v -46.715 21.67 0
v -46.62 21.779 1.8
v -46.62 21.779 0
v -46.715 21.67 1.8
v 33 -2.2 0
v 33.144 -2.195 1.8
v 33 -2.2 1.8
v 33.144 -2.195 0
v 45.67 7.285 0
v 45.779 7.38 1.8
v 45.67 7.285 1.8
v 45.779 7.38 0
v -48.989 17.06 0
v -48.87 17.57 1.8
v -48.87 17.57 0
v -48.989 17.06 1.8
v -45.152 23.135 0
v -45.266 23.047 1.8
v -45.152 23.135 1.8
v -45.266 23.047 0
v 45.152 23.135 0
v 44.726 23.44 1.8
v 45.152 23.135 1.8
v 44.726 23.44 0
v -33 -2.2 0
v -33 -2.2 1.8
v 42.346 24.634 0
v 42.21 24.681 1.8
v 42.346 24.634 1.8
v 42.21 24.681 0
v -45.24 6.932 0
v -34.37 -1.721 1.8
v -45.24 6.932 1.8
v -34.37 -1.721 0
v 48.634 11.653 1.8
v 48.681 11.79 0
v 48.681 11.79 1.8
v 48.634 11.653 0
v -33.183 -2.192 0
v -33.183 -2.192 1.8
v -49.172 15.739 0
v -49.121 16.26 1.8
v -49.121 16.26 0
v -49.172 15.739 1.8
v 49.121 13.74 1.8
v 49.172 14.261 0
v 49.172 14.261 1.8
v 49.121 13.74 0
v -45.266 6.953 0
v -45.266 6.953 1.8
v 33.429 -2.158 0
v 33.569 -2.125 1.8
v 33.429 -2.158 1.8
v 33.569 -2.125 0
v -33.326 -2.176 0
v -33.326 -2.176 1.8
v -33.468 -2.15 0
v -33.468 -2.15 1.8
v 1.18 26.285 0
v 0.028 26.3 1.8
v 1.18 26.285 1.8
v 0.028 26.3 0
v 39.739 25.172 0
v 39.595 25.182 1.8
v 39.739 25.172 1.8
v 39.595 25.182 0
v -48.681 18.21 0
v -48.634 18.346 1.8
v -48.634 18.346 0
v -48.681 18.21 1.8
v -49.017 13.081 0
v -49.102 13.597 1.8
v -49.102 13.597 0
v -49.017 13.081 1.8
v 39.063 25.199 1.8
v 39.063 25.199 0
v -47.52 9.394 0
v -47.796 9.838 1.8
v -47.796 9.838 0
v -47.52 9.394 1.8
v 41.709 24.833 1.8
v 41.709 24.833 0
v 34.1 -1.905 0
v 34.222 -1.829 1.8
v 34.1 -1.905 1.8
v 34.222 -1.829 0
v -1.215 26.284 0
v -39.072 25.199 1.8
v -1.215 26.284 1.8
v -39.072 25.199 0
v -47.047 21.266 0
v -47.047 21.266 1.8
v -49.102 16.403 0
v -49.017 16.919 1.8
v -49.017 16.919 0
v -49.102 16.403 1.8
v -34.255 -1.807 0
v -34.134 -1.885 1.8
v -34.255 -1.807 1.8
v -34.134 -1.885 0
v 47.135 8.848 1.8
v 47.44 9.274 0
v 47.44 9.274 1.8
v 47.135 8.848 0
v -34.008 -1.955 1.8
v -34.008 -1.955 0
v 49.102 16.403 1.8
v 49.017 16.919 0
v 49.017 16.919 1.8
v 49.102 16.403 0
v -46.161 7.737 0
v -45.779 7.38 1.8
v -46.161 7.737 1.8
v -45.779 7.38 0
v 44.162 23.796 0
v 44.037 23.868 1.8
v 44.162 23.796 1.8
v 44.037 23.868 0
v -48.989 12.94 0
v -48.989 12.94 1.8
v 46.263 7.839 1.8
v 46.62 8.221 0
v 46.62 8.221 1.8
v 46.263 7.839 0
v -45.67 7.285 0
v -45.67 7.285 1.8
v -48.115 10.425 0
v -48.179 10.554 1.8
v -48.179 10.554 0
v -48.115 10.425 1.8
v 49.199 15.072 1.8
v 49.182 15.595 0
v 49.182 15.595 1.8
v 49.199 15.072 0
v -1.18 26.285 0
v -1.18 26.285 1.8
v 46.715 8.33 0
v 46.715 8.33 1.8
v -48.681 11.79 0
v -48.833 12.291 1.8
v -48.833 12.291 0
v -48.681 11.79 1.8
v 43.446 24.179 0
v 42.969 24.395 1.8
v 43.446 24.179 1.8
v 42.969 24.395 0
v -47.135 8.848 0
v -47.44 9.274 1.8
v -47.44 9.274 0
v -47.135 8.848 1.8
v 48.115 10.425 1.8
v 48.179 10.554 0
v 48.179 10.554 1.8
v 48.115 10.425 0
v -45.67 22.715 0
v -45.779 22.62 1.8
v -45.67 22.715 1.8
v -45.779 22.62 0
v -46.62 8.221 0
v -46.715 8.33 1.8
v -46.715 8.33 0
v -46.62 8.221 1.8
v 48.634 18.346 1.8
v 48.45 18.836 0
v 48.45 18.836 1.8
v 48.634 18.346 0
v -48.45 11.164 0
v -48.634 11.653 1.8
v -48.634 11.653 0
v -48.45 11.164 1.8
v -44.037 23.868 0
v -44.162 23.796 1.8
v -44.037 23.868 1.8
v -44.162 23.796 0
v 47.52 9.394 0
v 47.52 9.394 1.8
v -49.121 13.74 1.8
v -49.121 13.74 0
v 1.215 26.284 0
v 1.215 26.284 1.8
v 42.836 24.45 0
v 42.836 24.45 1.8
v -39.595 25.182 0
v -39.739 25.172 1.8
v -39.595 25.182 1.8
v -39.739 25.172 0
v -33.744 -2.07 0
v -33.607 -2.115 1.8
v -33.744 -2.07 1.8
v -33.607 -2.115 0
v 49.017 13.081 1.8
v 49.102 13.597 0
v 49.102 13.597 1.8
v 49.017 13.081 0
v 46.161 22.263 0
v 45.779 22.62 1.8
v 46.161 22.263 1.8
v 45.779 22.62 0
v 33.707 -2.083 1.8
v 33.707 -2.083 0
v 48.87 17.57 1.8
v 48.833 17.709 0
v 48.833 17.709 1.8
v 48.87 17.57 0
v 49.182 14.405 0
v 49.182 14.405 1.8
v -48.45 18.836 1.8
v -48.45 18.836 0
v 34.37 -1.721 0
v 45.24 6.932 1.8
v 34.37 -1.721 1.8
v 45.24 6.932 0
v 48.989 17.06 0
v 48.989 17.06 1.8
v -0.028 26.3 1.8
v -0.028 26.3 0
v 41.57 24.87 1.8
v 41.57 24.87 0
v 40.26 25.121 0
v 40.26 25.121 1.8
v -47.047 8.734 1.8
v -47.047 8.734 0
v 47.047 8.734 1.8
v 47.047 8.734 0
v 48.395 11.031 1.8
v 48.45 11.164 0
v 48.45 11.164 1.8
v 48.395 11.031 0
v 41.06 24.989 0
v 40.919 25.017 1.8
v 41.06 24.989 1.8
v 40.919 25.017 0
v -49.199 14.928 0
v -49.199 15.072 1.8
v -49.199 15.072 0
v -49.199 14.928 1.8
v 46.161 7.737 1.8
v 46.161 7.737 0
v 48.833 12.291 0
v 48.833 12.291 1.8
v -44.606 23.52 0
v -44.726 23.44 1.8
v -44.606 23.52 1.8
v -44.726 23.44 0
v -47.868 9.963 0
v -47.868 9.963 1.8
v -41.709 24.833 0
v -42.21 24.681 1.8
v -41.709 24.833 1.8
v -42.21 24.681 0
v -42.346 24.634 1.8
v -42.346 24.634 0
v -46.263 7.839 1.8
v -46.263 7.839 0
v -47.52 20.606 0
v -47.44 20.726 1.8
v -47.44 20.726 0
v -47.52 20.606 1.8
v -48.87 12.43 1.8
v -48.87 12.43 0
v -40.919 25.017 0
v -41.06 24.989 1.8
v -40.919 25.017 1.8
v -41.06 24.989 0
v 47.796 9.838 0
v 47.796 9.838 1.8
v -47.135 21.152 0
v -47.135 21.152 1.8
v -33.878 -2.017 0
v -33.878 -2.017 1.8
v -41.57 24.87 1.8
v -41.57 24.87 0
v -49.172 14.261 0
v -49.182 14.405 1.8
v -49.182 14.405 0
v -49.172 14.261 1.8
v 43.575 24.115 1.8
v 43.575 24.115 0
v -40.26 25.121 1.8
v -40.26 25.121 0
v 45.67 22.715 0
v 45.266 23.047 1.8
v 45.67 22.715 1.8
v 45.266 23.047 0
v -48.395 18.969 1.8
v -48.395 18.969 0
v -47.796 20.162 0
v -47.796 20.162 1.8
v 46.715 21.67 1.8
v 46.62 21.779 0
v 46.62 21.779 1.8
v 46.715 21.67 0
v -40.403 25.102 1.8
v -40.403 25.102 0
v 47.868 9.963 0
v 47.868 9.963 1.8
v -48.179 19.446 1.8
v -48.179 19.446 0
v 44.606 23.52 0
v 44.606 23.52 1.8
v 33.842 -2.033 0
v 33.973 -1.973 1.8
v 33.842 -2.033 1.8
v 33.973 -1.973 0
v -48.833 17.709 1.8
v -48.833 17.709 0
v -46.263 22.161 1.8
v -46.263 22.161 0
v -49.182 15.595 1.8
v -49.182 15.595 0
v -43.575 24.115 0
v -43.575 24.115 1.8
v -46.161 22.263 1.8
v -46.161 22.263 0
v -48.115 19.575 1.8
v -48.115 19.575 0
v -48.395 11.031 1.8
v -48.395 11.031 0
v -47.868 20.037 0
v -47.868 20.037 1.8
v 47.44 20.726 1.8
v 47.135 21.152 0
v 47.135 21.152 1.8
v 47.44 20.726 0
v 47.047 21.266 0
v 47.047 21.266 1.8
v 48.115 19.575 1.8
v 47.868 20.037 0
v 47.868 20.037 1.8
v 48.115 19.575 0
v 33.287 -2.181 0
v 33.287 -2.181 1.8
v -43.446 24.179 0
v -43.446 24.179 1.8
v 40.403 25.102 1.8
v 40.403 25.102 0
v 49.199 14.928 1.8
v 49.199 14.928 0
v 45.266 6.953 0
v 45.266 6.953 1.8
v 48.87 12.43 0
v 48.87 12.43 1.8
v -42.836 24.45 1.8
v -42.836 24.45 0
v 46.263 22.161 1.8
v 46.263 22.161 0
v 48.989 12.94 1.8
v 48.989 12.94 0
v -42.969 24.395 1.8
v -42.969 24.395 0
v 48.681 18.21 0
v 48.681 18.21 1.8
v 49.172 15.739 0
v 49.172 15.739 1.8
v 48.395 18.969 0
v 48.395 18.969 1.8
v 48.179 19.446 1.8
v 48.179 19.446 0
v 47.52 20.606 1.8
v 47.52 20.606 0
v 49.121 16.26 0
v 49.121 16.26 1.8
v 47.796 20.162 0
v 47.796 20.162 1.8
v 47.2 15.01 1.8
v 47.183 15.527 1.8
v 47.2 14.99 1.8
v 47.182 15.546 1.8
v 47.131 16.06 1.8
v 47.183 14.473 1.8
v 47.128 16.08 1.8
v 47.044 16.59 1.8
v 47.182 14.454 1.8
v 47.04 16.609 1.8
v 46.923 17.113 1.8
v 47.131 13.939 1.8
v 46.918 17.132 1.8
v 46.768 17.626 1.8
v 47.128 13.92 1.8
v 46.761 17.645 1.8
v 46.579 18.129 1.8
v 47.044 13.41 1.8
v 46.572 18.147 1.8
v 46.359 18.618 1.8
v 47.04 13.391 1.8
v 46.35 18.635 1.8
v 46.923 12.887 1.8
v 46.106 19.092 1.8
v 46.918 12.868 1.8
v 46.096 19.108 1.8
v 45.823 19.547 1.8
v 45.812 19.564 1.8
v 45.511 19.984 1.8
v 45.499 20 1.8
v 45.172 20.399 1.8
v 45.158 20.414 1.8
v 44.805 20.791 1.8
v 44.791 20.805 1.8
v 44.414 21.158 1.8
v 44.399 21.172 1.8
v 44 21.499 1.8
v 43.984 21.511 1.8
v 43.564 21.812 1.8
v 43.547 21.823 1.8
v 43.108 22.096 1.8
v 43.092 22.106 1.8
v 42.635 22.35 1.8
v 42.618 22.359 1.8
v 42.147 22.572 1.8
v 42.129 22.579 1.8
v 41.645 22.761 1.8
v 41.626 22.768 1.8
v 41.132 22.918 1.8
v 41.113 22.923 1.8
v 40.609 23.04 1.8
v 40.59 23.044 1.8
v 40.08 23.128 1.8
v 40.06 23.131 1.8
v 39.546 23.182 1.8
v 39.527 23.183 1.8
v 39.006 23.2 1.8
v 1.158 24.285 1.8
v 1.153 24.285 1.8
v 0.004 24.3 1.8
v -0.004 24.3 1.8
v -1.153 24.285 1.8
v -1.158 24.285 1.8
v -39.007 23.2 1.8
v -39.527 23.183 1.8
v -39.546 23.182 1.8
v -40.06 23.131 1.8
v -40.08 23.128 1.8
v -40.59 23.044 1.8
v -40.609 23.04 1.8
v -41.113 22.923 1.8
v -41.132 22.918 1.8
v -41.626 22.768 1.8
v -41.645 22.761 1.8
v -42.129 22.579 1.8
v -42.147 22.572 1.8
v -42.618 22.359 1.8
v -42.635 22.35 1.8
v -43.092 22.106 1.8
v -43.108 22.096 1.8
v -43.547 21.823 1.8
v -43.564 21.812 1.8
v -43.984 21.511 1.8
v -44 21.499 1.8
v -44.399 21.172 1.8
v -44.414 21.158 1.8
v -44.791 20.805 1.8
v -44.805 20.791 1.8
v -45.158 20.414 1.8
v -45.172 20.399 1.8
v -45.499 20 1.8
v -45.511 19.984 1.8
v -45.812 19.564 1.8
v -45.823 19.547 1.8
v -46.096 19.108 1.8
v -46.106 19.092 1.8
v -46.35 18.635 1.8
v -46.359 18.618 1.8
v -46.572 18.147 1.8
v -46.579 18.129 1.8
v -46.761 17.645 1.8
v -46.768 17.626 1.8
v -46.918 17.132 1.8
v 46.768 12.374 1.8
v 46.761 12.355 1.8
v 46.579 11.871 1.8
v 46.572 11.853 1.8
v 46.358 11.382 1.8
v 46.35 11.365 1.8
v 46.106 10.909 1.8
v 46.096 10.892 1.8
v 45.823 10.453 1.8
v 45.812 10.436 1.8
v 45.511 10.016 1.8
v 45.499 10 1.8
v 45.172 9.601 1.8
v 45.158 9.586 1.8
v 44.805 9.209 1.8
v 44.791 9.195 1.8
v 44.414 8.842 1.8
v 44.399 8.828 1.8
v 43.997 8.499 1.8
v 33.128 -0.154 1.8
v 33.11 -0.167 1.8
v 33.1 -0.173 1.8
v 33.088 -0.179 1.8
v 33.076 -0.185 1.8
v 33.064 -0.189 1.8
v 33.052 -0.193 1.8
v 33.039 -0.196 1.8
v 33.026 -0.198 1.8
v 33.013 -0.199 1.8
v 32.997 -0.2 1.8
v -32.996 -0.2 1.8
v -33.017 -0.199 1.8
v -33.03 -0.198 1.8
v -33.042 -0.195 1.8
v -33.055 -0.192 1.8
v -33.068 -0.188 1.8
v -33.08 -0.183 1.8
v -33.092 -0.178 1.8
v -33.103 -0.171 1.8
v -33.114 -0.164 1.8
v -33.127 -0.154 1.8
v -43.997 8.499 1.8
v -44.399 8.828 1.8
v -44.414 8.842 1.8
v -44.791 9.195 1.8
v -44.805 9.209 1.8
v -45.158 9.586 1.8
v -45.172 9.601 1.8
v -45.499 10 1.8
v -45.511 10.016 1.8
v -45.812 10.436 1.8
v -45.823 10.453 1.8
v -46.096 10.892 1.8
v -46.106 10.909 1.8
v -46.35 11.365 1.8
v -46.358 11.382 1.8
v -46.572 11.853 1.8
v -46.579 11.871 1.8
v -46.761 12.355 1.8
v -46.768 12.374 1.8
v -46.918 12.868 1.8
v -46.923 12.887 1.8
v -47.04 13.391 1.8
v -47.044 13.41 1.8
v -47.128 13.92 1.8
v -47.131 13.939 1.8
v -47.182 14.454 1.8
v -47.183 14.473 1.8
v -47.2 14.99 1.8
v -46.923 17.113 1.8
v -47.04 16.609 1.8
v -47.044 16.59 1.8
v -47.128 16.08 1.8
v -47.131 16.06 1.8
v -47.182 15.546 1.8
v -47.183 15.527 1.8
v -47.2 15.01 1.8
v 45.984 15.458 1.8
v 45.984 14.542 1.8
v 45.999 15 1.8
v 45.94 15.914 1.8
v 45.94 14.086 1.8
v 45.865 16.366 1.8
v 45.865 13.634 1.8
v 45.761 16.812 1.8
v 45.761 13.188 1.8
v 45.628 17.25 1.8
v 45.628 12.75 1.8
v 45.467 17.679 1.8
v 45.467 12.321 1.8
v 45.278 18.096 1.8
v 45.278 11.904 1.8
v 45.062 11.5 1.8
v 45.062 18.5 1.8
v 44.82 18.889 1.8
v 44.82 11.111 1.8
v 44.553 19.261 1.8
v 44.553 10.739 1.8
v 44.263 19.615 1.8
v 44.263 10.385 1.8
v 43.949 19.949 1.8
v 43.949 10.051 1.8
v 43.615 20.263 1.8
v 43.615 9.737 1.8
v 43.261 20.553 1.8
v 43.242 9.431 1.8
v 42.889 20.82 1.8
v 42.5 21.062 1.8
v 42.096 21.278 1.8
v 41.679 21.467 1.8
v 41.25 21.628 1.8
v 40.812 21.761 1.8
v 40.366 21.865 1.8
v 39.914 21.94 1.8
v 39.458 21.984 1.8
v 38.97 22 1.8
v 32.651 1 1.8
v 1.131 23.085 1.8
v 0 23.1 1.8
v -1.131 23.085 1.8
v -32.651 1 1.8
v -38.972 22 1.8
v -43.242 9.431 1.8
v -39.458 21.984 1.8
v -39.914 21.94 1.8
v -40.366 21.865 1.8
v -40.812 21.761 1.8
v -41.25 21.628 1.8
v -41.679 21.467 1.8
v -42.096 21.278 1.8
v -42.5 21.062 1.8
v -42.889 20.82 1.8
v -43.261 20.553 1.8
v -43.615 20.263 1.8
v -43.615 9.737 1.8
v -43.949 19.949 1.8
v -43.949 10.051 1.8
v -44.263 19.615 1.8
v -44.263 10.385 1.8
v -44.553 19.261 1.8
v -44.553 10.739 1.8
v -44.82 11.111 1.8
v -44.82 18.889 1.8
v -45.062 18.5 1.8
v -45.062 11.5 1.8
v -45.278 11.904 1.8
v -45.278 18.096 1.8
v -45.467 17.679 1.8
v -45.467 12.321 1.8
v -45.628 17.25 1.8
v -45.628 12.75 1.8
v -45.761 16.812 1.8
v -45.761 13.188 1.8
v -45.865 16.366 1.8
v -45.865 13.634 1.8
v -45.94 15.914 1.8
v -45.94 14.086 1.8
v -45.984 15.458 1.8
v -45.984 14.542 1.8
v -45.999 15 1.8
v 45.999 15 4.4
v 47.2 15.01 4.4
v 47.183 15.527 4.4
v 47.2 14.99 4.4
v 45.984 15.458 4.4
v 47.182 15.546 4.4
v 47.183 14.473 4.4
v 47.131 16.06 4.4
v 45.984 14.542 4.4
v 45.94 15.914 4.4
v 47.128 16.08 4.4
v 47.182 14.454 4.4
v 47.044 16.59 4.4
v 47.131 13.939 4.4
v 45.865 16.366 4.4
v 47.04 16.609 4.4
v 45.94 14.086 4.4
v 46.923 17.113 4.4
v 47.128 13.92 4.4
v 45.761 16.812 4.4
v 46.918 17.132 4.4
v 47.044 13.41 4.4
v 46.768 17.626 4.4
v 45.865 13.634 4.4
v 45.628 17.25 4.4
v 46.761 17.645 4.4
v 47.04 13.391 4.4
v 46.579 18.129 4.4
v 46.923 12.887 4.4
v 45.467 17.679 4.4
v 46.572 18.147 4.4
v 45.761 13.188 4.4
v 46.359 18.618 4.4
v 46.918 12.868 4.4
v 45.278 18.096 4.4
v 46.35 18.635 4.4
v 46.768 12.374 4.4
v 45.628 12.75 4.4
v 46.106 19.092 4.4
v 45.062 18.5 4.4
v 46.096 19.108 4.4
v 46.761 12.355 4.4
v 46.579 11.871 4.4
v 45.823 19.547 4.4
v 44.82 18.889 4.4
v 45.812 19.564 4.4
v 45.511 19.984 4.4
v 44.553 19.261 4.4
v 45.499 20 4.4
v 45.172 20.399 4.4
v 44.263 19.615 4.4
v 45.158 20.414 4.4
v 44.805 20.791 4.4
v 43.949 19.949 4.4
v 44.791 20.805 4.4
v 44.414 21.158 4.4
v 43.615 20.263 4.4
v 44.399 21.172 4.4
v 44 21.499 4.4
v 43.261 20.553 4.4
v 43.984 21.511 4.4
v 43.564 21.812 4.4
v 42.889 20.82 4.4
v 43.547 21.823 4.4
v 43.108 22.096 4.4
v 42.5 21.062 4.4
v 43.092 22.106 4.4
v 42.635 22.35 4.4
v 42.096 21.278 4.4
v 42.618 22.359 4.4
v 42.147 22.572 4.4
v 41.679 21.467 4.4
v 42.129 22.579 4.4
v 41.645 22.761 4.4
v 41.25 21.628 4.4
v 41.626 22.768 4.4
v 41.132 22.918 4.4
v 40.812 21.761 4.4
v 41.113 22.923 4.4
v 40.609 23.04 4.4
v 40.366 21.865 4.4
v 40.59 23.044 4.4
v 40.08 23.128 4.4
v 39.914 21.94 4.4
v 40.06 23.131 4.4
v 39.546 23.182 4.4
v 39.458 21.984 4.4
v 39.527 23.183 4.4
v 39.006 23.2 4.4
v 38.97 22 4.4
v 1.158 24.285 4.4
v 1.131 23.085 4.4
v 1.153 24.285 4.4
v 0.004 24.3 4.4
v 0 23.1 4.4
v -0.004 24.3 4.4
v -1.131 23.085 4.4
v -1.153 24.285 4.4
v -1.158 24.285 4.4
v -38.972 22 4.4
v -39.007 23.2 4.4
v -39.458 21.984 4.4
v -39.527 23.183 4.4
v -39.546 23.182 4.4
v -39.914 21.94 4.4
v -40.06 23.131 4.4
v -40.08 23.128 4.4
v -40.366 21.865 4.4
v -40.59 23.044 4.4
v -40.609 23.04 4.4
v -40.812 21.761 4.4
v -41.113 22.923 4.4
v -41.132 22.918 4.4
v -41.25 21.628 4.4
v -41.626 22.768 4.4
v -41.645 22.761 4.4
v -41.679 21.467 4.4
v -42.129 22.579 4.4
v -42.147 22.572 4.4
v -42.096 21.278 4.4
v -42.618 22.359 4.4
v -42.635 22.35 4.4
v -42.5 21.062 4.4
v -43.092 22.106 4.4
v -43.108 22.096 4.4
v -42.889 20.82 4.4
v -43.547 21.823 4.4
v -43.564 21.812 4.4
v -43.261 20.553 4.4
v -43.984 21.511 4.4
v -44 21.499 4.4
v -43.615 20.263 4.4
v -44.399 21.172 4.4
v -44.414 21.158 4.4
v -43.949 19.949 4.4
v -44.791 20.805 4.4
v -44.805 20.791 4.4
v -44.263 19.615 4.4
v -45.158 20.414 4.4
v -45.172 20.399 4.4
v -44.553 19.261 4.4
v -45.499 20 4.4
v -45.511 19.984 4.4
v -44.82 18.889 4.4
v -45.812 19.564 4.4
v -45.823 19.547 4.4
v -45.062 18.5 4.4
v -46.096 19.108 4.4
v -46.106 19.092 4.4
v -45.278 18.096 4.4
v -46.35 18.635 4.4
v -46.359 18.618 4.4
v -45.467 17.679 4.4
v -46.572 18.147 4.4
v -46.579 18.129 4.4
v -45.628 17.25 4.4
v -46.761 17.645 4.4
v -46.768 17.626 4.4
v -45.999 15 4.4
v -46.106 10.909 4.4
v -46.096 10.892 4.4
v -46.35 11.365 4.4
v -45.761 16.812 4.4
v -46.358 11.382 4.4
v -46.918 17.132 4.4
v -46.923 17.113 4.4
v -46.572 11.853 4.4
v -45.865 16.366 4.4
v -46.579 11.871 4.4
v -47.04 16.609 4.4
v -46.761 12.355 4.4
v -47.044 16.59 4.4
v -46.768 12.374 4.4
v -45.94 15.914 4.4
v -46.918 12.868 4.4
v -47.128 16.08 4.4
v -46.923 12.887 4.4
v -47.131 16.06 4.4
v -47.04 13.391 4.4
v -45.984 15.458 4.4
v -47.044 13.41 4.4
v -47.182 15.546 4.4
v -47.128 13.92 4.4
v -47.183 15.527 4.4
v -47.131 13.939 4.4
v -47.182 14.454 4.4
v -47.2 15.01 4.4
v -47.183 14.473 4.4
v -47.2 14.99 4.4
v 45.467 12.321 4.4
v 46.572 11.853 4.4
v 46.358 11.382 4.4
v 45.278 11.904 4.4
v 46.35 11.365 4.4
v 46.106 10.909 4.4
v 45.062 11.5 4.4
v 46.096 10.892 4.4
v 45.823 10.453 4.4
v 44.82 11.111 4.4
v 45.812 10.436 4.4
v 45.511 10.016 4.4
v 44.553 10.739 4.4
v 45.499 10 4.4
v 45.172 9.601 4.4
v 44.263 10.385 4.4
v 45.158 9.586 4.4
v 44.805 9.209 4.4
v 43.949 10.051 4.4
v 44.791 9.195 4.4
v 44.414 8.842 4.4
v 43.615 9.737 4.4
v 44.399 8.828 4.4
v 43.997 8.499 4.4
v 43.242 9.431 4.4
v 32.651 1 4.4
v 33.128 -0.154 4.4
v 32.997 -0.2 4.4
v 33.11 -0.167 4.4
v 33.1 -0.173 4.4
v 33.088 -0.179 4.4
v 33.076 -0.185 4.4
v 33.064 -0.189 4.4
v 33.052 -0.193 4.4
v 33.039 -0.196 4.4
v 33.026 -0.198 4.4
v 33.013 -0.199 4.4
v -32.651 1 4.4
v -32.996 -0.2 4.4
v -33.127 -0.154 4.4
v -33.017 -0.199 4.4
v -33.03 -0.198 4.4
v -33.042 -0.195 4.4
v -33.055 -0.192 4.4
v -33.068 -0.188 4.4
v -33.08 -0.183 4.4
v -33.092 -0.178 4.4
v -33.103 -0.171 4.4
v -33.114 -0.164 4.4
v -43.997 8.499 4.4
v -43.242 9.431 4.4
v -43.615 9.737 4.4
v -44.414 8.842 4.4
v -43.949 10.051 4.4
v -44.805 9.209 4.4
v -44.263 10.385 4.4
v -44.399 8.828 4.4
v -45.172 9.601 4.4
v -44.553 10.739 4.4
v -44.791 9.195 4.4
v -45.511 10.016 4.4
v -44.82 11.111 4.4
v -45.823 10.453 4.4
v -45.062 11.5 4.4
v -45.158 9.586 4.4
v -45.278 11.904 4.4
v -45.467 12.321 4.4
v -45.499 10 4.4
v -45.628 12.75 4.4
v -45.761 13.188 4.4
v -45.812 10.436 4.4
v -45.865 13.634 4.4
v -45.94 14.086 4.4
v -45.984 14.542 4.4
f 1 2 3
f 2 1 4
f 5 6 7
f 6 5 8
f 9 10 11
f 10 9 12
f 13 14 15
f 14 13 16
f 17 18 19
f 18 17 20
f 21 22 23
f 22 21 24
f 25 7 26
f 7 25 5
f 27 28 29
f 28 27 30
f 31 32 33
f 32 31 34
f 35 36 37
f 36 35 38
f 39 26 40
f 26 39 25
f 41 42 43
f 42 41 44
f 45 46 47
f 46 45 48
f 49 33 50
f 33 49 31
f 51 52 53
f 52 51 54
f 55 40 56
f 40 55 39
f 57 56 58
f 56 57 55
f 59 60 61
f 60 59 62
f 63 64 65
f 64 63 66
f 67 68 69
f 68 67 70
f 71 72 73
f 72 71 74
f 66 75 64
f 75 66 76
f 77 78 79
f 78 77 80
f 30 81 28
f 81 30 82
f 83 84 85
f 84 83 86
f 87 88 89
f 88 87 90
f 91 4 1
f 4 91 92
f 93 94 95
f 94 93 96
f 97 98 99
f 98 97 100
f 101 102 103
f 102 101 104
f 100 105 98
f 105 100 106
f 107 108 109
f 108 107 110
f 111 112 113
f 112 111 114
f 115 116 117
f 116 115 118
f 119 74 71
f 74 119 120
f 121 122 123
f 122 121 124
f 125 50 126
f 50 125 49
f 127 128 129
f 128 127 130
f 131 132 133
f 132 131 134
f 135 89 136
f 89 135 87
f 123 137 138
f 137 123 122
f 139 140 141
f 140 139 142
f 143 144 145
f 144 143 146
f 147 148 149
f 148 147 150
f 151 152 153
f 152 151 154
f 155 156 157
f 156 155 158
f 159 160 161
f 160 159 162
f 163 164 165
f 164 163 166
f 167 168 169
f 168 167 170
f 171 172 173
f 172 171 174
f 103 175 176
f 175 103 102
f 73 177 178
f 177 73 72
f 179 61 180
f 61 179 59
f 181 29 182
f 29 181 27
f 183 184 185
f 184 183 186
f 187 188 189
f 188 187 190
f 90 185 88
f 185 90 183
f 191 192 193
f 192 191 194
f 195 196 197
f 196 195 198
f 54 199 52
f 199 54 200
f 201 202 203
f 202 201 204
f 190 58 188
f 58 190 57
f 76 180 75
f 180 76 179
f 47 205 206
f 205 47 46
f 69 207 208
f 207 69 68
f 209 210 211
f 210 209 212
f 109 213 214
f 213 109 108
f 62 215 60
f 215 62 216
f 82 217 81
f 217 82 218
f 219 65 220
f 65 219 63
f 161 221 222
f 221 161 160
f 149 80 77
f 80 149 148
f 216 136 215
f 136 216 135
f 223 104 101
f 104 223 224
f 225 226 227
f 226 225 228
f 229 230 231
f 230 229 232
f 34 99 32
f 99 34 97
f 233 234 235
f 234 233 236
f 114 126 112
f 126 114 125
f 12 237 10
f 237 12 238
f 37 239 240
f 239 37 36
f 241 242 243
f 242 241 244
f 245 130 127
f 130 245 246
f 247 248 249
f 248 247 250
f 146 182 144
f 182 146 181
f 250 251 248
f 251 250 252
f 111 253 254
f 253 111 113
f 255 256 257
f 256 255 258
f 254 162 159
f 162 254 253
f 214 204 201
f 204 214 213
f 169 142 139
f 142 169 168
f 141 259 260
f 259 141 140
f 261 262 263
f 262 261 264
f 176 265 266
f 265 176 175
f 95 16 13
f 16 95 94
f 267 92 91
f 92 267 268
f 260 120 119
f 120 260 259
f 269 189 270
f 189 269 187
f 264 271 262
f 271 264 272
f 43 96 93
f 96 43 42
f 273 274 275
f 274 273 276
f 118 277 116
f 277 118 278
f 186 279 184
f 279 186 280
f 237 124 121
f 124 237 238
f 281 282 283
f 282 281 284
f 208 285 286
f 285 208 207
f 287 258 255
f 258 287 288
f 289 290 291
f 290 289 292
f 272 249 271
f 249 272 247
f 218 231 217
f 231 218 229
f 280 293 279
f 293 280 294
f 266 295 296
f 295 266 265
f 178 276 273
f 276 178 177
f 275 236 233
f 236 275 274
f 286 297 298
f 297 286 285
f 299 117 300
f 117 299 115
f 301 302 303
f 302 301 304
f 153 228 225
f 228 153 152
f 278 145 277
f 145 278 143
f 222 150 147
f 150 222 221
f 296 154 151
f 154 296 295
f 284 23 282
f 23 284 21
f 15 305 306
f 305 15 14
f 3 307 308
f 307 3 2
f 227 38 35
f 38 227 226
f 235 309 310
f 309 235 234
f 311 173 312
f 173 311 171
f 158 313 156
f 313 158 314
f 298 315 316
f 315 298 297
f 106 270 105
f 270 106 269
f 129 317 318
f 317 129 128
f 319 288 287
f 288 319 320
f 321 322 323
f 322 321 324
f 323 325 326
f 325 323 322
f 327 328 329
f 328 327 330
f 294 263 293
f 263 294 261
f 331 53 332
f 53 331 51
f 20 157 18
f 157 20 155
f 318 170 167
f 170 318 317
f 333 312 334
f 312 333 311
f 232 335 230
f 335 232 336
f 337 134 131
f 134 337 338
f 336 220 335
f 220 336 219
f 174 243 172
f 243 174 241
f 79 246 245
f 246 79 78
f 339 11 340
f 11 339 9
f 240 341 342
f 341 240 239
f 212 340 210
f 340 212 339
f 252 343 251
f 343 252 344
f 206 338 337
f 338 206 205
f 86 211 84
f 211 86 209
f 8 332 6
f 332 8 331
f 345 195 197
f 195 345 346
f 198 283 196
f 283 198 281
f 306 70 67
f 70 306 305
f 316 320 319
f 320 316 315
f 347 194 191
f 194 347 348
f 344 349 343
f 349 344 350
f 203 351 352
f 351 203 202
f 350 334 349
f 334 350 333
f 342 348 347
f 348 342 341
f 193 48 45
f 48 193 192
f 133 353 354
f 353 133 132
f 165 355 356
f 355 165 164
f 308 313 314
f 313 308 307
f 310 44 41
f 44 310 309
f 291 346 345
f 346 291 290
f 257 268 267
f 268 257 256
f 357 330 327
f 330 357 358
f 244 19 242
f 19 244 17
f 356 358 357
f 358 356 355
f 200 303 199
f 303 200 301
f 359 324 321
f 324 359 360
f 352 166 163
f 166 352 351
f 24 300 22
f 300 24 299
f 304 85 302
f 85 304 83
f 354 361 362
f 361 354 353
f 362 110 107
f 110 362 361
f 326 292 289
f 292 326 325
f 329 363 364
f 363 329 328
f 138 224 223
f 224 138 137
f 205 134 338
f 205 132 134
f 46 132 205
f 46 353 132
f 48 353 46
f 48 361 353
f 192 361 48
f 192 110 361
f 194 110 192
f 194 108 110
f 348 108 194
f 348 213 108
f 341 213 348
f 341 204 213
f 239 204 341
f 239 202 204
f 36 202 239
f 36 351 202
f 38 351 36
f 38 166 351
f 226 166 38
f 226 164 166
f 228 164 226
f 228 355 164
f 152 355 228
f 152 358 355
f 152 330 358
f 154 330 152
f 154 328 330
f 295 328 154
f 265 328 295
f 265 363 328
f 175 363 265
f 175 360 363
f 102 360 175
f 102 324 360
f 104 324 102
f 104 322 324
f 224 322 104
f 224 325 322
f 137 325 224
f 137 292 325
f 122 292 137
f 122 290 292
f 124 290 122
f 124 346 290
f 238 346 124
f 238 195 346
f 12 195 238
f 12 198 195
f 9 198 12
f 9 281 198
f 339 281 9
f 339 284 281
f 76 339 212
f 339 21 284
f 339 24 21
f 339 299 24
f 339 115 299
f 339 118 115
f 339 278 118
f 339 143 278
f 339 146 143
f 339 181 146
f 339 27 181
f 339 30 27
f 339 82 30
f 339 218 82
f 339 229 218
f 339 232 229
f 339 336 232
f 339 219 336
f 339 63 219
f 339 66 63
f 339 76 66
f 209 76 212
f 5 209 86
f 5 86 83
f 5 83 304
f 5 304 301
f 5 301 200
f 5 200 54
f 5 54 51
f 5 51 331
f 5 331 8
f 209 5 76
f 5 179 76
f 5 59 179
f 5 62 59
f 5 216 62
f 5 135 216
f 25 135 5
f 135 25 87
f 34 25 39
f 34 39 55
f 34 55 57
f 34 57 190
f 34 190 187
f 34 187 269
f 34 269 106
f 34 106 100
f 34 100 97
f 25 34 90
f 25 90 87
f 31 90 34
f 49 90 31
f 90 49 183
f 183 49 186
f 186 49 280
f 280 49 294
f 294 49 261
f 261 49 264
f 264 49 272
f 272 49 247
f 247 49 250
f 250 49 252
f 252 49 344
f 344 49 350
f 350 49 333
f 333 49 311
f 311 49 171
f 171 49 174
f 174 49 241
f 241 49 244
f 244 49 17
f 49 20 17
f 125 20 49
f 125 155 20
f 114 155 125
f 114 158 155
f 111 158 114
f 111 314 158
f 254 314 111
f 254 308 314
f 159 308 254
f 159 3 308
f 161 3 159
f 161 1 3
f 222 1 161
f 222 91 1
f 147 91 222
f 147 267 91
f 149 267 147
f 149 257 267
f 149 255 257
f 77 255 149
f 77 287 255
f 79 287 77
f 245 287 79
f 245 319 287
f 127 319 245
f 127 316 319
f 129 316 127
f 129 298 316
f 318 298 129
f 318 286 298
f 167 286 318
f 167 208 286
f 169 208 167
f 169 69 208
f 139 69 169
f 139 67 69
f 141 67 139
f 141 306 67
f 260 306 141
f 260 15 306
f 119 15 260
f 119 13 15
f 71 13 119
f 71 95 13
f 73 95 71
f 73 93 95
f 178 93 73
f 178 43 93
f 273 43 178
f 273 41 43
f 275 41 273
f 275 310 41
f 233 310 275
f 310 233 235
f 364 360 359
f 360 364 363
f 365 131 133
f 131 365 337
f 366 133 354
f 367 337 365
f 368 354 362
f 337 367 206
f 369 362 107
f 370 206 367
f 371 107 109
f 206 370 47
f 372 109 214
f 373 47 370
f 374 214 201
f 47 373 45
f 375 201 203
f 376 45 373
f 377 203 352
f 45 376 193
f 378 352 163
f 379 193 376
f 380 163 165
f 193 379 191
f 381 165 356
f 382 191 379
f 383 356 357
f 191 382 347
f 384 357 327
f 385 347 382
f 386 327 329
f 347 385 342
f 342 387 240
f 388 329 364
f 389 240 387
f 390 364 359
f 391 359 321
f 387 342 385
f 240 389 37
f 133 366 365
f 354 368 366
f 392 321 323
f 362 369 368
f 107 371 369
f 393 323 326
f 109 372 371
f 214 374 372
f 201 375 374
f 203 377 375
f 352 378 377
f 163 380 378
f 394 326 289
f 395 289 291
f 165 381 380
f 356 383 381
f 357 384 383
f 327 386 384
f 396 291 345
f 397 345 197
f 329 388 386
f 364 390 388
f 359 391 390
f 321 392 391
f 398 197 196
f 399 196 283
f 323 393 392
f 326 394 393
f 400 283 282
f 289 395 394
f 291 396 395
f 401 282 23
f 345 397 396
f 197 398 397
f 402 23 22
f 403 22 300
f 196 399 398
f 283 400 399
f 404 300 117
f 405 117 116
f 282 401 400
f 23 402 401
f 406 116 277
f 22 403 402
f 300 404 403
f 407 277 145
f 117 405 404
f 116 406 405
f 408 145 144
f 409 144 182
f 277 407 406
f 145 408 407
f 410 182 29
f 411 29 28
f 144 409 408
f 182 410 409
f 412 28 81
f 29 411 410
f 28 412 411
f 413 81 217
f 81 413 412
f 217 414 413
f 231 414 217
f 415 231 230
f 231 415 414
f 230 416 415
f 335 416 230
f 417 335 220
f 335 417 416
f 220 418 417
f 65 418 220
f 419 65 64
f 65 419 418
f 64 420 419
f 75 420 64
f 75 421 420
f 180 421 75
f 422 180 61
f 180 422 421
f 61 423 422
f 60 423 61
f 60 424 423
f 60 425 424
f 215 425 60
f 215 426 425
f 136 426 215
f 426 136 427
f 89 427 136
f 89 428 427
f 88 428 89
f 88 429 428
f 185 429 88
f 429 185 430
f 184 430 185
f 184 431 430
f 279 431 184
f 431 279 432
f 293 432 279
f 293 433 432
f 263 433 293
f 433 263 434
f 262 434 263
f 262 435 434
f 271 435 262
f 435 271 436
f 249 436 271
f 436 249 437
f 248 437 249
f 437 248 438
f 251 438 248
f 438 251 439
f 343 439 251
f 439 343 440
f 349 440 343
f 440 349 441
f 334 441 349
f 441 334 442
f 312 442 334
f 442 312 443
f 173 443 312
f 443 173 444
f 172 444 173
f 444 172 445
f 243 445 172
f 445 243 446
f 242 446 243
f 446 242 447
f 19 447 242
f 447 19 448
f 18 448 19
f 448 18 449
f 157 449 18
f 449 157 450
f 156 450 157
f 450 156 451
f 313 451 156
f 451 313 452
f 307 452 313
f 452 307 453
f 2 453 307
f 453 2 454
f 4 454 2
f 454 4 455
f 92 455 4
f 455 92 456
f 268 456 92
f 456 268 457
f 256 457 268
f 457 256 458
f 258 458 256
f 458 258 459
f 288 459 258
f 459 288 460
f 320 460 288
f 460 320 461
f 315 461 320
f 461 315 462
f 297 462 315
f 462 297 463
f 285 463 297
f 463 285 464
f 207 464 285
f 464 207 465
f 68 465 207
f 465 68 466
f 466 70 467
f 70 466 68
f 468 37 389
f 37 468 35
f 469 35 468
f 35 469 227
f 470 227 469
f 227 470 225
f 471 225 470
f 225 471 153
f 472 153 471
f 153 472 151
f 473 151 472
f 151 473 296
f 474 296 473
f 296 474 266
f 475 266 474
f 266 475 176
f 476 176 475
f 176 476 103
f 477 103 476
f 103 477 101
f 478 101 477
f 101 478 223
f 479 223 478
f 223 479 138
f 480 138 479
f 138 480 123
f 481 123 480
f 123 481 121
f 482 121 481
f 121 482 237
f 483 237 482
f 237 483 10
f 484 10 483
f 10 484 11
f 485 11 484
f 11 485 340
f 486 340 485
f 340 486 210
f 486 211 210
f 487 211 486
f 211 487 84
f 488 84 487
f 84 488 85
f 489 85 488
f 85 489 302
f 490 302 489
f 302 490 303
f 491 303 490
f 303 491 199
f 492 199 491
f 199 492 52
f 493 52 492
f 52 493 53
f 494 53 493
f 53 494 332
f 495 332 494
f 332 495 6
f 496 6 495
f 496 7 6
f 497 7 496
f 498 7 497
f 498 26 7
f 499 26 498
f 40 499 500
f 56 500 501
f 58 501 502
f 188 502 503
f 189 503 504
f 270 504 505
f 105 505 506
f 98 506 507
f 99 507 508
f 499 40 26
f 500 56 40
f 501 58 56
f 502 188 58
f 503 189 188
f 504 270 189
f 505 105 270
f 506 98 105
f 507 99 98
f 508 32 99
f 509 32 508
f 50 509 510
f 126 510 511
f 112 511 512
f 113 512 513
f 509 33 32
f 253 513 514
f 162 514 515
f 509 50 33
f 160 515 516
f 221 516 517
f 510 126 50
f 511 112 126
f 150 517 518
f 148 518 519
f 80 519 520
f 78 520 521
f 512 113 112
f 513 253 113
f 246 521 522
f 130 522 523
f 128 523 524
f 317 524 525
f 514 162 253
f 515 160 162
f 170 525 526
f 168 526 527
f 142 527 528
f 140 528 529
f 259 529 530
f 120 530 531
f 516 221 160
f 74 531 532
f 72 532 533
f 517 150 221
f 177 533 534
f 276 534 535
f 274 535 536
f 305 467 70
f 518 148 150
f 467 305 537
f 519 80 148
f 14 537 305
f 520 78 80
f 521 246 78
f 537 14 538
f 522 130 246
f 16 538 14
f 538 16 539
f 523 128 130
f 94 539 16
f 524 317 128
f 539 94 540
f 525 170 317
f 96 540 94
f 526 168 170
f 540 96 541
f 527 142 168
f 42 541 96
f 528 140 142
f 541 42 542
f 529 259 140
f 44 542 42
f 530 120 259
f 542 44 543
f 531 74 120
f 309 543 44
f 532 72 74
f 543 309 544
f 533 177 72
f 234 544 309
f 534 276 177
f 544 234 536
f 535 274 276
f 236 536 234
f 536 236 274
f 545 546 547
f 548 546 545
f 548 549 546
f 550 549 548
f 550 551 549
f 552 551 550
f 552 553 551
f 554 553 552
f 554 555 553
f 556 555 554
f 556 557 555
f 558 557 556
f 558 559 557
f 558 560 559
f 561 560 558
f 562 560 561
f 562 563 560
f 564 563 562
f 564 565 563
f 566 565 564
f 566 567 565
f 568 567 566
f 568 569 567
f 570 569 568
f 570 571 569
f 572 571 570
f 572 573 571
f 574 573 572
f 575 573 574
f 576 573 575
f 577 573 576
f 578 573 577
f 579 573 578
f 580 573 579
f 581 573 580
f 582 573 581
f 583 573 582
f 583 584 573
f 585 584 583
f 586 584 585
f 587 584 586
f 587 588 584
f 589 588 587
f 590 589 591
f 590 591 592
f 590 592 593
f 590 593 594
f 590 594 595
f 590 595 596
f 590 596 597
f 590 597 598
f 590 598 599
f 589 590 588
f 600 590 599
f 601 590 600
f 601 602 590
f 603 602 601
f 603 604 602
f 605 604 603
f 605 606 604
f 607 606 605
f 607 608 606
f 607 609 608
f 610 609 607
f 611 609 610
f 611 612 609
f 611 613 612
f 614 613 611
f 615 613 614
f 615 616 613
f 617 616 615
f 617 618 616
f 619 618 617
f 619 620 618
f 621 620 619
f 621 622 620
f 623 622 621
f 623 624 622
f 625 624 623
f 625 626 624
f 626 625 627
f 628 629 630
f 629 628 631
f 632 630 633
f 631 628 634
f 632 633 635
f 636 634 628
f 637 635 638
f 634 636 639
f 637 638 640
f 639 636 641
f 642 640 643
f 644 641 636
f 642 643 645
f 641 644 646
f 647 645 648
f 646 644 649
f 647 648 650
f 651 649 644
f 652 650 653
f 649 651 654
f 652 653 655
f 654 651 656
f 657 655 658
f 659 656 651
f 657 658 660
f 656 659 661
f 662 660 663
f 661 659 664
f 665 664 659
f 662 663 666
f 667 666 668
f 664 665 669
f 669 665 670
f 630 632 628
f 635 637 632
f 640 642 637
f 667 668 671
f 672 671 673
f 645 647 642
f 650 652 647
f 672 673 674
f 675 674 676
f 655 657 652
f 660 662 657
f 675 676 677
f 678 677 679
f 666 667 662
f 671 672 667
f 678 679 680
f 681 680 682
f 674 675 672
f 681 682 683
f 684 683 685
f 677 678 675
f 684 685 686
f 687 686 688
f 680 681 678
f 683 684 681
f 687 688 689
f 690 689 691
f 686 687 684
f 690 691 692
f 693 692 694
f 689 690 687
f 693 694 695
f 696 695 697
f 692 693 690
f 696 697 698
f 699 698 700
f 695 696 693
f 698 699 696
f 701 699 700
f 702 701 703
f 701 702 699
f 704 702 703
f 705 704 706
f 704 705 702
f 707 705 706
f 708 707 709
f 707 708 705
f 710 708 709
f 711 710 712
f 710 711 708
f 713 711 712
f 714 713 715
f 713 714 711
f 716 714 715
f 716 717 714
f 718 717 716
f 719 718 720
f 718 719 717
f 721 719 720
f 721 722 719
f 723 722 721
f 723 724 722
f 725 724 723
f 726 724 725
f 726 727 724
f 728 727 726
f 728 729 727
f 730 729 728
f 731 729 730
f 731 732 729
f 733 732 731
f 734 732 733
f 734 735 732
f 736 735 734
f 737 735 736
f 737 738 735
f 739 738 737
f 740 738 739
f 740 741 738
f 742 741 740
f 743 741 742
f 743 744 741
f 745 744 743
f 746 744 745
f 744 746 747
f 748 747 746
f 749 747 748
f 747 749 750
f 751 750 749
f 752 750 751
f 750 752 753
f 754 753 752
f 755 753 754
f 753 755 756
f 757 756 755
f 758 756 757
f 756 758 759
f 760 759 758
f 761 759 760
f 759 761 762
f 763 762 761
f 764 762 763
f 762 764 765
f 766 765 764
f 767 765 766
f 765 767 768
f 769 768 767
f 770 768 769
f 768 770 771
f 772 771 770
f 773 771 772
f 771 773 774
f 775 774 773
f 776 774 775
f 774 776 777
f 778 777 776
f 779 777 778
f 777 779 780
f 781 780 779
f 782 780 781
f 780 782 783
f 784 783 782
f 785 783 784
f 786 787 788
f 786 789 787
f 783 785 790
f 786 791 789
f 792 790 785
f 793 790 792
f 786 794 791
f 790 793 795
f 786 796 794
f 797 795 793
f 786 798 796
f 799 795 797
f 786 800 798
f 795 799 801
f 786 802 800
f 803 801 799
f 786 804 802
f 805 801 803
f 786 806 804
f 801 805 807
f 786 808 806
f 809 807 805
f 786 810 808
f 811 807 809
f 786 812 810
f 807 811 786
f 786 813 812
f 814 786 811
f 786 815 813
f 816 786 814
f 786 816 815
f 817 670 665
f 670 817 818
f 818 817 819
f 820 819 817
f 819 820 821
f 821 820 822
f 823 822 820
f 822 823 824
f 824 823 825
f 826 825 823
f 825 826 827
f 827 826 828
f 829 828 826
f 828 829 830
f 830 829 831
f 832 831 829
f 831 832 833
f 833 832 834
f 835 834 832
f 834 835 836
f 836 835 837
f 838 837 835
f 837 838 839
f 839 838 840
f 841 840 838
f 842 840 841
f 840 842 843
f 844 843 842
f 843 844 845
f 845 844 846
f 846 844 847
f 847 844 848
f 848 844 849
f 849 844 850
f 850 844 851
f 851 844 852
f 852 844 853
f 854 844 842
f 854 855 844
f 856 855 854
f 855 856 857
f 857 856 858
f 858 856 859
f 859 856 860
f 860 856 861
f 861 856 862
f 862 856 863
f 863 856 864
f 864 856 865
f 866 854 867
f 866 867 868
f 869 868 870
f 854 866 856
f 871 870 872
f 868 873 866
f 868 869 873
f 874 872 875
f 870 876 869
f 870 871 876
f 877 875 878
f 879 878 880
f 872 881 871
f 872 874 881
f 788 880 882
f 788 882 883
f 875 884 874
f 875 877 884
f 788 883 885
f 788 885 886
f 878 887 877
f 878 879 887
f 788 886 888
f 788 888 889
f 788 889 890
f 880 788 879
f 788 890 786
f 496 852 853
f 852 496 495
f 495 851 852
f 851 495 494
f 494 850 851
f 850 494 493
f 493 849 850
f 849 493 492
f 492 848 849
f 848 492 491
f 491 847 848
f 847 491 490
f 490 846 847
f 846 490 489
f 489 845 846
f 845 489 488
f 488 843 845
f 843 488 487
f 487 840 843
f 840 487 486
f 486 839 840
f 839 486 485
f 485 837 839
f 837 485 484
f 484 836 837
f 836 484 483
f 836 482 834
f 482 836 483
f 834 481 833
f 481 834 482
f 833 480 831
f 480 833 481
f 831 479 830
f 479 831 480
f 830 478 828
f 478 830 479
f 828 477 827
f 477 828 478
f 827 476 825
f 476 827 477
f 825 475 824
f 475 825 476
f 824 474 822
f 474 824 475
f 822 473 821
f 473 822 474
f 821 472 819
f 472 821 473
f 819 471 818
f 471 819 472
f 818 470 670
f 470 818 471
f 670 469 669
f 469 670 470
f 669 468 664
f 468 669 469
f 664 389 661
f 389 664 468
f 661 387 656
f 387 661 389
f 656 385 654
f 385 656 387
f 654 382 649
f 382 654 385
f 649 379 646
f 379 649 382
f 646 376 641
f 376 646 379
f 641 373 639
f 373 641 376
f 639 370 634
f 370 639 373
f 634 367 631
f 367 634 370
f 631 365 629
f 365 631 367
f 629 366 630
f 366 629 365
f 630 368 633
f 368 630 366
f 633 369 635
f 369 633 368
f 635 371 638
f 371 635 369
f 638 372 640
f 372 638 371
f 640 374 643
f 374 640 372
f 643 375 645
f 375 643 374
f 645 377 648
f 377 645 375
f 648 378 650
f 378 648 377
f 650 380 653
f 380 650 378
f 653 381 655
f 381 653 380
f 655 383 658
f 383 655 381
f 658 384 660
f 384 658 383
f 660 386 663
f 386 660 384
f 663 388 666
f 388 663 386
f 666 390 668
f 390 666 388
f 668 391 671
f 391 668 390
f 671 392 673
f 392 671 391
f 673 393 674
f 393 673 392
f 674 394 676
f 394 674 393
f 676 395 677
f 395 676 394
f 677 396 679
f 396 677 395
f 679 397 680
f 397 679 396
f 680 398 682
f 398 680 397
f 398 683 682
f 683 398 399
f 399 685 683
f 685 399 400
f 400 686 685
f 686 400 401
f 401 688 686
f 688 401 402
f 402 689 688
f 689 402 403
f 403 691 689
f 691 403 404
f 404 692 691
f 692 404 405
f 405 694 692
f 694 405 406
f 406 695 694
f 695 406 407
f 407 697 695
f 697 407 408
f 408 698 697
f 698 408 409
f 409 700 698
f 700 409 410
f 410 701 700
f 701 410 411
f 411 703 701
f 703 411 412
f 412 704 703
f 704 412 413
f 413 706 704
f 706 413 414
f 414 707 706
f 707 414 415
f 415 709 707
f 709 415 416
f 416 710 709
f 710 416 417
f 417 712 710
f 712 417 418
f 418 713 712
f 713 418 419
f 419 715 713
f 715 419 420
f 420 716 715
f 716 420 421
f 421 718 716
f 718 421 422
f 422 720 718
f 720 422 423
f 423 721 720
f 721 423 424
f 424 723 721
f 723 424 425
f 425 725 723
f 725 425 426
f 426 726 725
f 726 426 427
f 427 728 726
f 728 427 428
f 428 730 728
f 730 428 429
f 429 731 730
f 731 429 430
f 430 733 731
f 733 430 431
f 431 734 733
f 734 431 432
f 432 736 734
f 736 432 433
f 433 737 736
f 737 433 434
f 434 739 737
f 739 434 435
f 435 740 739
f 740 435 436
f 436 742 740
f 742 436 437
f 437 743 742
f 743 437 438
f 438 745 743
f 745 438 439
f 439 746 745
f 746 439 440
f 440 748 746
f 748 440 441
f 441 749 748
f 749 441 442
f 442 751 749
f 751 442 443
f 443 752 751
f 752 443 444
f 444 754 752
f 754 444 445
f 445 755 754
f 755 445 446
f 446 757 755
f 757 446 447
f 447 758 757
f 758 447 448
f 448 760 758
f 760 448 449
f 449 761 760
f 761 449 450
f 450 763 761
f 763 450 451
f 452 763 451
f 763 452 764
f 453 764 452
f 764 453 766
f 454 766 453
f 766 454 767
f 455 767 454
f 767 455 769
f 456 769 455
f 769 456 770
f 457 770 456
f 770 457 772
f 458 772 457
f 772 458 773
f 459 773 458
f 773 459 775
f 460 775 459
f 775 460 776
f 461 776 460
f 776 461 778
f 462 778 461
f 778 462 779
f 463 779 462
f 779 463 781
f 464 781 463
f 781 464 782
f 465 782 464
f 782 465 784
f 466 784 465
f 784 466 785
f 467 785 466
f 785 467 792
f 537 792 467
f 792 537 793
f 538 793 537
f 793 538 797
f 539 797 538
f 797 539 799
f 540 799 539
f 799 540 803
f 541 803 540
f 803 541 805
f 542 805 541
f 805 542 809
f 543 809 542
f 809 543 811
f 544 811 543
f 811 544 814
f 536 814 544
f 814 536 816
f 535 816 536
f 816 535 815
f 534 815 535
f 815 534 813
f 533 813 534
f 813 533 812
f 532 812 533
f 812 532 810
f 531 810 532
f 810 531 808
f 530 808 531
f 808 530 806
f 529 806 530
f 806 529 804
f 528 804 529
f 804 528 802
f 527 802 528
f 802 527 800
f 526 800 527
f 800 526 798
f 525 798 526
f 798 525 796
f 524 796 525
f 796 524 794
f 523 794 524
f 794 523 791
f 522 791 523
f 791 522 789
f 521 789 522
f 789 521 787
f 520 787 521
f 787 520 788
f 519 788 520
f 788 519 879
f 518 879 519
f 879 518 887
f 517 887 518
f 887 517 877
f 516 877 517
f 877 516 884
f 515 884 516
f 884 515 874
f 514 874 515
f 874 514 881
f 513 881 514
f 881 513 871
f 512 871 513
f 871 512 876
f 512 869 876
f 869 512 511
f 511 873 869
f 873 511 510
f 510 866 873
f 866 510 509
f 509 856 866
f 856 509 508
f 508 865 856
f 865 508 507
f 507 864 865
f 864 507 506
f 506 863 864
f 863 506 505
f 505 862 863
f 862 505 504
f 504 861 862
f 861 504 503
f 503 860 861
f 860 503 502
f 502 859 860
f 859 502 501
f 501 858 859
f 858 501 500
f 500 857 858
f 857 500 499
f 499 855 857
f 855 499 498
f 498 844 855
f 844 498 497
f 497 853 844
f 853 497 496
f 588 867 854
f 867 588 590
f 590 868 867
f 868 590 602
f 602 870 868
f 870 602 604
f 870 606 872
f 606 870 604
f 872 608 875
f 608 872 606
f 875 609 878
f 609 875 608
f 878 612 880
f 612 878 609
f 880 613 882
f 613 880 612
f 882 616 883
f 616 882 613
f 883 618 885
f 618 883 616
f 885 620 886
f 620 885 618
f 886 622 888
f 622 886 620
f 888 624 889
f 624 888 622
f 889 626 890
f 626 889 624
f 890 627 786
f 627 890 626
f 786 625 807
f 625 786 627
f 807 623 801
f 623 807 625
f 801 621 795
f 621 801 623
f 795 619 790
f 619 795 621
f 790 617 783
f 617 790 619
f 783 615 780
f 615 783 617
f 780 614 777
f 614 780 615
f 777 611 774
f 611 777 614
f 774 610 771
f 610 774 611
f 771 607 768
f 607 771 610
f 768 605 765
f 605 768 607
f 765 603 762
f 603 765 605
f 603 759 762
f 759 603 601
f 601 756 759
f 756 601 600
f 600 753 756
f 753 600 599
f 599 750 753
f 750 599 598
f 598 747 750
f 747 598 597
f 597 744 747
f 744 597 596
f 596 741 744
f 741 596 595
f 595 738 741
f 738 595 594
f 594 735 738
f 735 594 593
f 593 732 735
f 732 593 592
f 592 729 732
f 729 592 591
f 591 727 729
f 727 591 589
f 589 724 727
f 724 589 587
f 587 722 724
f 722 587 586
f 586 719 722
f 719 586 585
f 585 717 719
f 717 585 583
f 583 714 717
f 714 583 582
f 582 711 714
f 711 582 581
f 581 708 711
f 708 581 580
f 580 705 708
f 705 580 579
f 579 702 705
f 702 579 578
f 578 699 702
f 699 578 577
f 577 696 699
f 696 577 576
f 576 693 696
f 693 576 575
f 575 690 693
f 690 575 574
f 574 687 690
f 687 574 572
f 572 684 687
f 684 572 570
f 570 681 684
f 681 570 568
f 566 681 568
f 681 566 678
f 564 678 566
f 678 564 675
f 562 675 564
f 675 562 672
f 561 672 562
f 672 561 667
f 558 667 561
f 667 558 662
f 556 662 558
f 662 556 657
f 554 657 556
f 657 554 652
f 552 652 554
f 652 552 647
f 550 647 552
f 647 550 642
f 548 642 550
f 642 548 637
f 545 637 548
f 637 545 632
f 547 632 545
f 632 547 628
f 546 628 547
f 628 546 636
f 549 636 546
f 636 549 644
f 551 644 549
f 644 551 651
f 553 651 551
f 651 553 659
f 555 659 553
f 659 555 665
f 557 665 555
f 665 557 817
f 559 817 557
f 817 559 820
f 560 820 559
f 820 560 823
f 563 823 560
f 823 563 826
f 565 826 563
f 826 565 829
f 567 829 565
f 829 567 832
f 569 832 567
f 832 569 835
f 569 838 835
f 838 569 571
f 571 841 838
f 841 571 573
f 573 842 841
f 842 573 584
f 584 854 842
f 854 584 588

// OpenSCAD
// file: ../params.scad
// Piper-Watch - all dimensions in one place (millimetres).
// Values marked EST are estimates; correct them after measuring the real part.

$fn = 96;                        // circle smoothness for previews/exports

// --- Printing: Bambu Lab A1, 0.4 mm nozzle, PETG -------------------------------
line_w      = 0.45;              // extrusion width
wall        = 4 * line_w;        // 1.8 mm: minimum for load-bearing walls
bed         = [225, 225, 225];   // build volume
clr_hole    = 0.30;              // added to bolt hole diameters - measured: +0.3 is the smallest free fit (coupon, 2026-10-01)
clr_fit     = 0.35;              // gap for parts that slide/rotate against each other (a little looser than clr_hole)

// --- Fasteners ------------------------------------------------------------------
m3          = 3.0;
m4          = 4.0;
insert_m3   = [4.1, 5.0];        // heat-set insert bore [diameter, depth] - coupon "M3a" confirmed
insert_m4   = [5.6, 6.0];        // coupon "M4a" confirmed
m5          = 5.0;
insert_m5   = [6.4, 7.0];        // EST - confirm with parts/m5_coupon.scad

// --- Lazy Susan: 140 mm round aluminium turntable bearing (Amazon B08CSMCRC6) ----
// Two COPLANAR rings, both 10.5 mm thick and flush top and bottom, with a 0.8 mm gap.
// The outer ring screws down into the box (countersinks on top); the inner ring
// screws up into the turntable top plate (countersinks underneath). No access hole.
ls_od        = 140;              // outer ring, outside (measured)
ls_ring_w    = 12.4;             // radial width of each ring (measured)
ls_gap       = 0.8;              // radial gap between the rings (measured)
ls_outer_id  = ls_od - 2 * ls_ring_w;            // 115.2  outer ring, inside
ls_inner_od  = ls_outer_id - 2 * ls_gap;         // 113.6  inner ring, outside
ls_id        = ls_inner_od - 2 * ls_ring_w;      // 88.8   centre opening (measured ~89)
ls_h         = 10.5;             // thickness of both rings (measured)
ls_hole_d    = 5.05;             // through holes, countersunk (measured 5.05; M5 passes) -> M5 flat-head screws
ls_outer_bc  = (ls_od + ls_outer_id) / 2;       // 127.6  holes centred in the outer ring (observed)
ls_inner_bc  = (ls_inner_od + ls_id) / 2;       // 101.2  holes centred in the inner ring (observed)
ls_holes     = 4;                // per ring, 90 degrees apart
ls_inner_rot = 45;               // inner holes sit between the outer ones

// Mounting rules that follow from the flush rings
ls_clear     = 1.0;              // keep printed parts this far (diameter) from the other ring
top_plate_d  = ls_inner_od - ls_clear;           // 112.6  turntable plate touches the inner ring only
plinth_id    = ls_outer_id + ls_clear;           // 116.2  box-top plinth touches the outer ring only
plinth_h     = 2.0;              // raised plinth height = clear gap under the inner ring

// --- Feetech STS3215 (12 V / 30 kg.cm) - EST from datasheet, verify on arrival --
sts_body     = [45.2, 24.7, 35]; // length x width x height (without horn)
sts_shaft_x  = 11.5;             // EST: output shaft centre from the near end
sts_horn_d   = 20;               // EST: horn diameter
sts_horn_h   = 3;

// --- Logitech C920X, housing partly stripped (photos: cam_front.jpg, cam_top.jpg) ---
// Seen from above it is a lozenge: flat glossy front face, rounded back, rounded ends
// (the mic grilles) with a small notch where each grille meets the face.
cam_w        = 94;               // width, along the tilt axis (measured)
cam_h        = 29;               // height (measured)
cam_d        = 24.1;             // depth front-to-back at the middle (measured)
cam_face_l   = 63.5;             // flat front face length between the notches (measured)
cam_cable_x  = 30;               // cable leaves the back this far from the nearest end (measured)
cam_cable_d  = 3.0;              // cable diameter (measured); USB-A plug on the end, so it can't thread through holes
cam_core     = [cam_w, cam_d, cam_h];

// --- E32R40T 4" display board - TODO: measure outline, holes, connector positions --
lcd_board    = [110, 70, 12];    // EST placeholder
// file: camera_pod.scad
// Camera pod - holds the stripped C920X and tilts between the two cheeks.
//
// Built the "Fusion way": draw the camera's outline seen from above (2D), then
// extrude it upward. The same outline, grown with offset(), gives the cavity
// (camera + clearance) and the outer shell (cavity + wall).
//
// Coordinates: the camera looks toward -Y. Its flat front face lies on y = 0,
// its back reaches y = cam_d, it sits on z = 0, and it is centred on x = 0.
// The tilt axis runs along X through the middle of the camera (see `axis`).
//
// This file makes the BODY (floor + walls + pivots). The lid is
// parts/camera_pod_lid.scad, which reuses the modules below.
include <../params.scad>

fit     = 0.4;            // clearance between camera and cavity, all round
lip_h   = 3;              // height of the lid's locating lip inside the cavity
end_r   = 8;              // EST: radius of the camera's rounded ends (mic grilles)
end_y   = 15;             // EST: depth position of those end circles' centres
back_a  = 33;             // EST: half-length of the back curve (smaller = rounder back)

axis    = [0, cam_d / 2, cam_h / 2];   // tilt axis passes through this point, along X

// Pivots: 's' = servo side (-X), 'o' = idler side (+X)
horn_d     = sts_horn_d;  // boss the servo horn screws onto
horn_hole  = 3.2;         // EST centre hole; horn screw pattern to be added when measured
axle_od    = 12;          // idler axle, rides in a bearing/bushing in the cheek
axle_id    = 5;           // bore for the cable
axle_slot  = cam_cable_d + 0.4;   // slot so the cable slides in sideways (the USB plug can't pass)
pivot_len  = 6;           // how far each pivot sticks out of the end wall

// ---- 2D: the camera's outline seen from above -------------------------------------
// hull() wraps a rubber band around its children - like sketching tangent arcs:
//   * a thin strip for the flat front face
//   * a circle at each rounded end
//   * the back half of an ellipse for the curved back
// (The small notches where the grilles meet the face are inside the hull, so the
//  pod just has a little extra room there.)
module cam_outline() {
    hull() {
        translate([-cam_face_l / 2, 0]) square([cam_face_l, 0.01]);
        for (sx = [-1, 1])
            translate([sx * (cam_w / 2 - end_r), end_y]) circle(r = end_r);
        intersection() {                                  // back half of an ellipse
            scale([back_a / cam_d, 1]) circle(r = cam_d, $fn = 180);
            translate([-cam_w, 0]) square([2 * cam_w, cam_d]);
        }
    }
}

// The same outline grown outward: + fit = cavity, + fit + wall = outer shell
module cavity_outline() { offset(r = fit) cam_outline(); }
module shell_outline()  { offset(r = fit + wall) cam_outline(); }

cavity_h = cam_h + 2 * fit + lip_h;   // camera + clearance + room for the lid's lip

// ---- 3D: body = shell extruded, minus cavity, minus windows ----------------------
module pod_body() {
    difference() {
        union() {
            // floor + walls: extrude the shell outline from below the floor to the top
            translate([0, 0, -fit - wall])
                linear_extrude(height = wall + cavity_h) shell_outline();
            pivots();
        }
        // the cavity, open at the top (the lid closes it)
        translate([0, 0, -fit]) linear_extrude(height = cavity_h + 1) cavity_outline();

        // front window: shows the glossy face and lens, keeps a rim all round
        translate([-cam_face_l / 2 + 3, -10, 2]) cube([cam_face_l - 6, 20, cam_h - 4]);

        // cable exit in the back wall, 30 mm from the idler-side (+X) end
        translate([cam_w / 2 - cam_cable_x, cam_d - 2, cam_h / 2])
            rotate([-90, 0, 0]) cylinder(d = cam_cable_d + 1, h = 10);

        // bores through the pivots
        // servo-side centre hole, through the horn boss and its end wall
        translate(axis) rotate([0, -90, 0])
            translate([0, 0, cam_w / 2 - 1]) cylinder(d = horn_hole, h = fit + wall + pivot_len + 2);
        translate(axis) rotate([0, 90, 0]) idler_bore();
    }
}

// Pivots sit on the tilt axis, sticking out of each end wall
module pivots() {
    end_x = cam_w / 2 + fit + wall;          // outside face of the end walls
    translate(axis) rotate([0, 90, 0]) {
        // 's' servo side: a disc the horn screws onto
        translate([0, 0, -end_x - pivot_len]) cylinder(d = horn_d, h = pivot_len + wall);
        // 'o' idler side: an axle
        translate([0, 0, end_x - wall]) cylinder(d = axle_od, h = pivot_len + wall);
    }
}

// Idler axle bore + slot (in the axle's own frame: axle along +Z). Only the
// protruding axle is hollowed: the slot lets the cable be laid in sideways later,
// when the cheek's cable route is designed. The end wall itself stays solid.
module idler_bore() {
    end_x = cam_w / 2 + fit + wall;
    translate([0, 0, end_x]) {
        cylinder(d = axle_id, h = pivot_len + 1);
        translate([0, -axle_slot / 2, 0]) cube([axle_od, axle_slot, pivot_len + 1]);
    }
}

// ---- Lid: a plate in the shell outline with a lip that drops into the cavity ------
lid_t   = wall;                 // plate thickness
lip_w   = 1.2;                  // lip wall thickness
lip_clr = 0.2;                  // gap between lip and cavity wall (friction fit)

module pod_lid() {              // modelled upside down, i.e. as printed: plate on the bed
    linear_extrude(height = lid_t) shell_outline();
    translate([0, 0, lid_t]) linear_extrude(height = lip_h - 0.4)
        difference() {
            offset(delta = -lip_clr) cavity_outline();
            offset(delta = -lip_clr - lip_w) cavity_outline();
        }
}

pod_body();

// Ghost of the camera block for reference (not part of the model) - remove the % to hide
%linear_extrude(height = cam_h) cam_outline();
// main file
// Camera pod lid - friction-fit lid for parts/camera_pod.scad (printed plate-down).
use <camera_pod.scad>
pod_lid();
